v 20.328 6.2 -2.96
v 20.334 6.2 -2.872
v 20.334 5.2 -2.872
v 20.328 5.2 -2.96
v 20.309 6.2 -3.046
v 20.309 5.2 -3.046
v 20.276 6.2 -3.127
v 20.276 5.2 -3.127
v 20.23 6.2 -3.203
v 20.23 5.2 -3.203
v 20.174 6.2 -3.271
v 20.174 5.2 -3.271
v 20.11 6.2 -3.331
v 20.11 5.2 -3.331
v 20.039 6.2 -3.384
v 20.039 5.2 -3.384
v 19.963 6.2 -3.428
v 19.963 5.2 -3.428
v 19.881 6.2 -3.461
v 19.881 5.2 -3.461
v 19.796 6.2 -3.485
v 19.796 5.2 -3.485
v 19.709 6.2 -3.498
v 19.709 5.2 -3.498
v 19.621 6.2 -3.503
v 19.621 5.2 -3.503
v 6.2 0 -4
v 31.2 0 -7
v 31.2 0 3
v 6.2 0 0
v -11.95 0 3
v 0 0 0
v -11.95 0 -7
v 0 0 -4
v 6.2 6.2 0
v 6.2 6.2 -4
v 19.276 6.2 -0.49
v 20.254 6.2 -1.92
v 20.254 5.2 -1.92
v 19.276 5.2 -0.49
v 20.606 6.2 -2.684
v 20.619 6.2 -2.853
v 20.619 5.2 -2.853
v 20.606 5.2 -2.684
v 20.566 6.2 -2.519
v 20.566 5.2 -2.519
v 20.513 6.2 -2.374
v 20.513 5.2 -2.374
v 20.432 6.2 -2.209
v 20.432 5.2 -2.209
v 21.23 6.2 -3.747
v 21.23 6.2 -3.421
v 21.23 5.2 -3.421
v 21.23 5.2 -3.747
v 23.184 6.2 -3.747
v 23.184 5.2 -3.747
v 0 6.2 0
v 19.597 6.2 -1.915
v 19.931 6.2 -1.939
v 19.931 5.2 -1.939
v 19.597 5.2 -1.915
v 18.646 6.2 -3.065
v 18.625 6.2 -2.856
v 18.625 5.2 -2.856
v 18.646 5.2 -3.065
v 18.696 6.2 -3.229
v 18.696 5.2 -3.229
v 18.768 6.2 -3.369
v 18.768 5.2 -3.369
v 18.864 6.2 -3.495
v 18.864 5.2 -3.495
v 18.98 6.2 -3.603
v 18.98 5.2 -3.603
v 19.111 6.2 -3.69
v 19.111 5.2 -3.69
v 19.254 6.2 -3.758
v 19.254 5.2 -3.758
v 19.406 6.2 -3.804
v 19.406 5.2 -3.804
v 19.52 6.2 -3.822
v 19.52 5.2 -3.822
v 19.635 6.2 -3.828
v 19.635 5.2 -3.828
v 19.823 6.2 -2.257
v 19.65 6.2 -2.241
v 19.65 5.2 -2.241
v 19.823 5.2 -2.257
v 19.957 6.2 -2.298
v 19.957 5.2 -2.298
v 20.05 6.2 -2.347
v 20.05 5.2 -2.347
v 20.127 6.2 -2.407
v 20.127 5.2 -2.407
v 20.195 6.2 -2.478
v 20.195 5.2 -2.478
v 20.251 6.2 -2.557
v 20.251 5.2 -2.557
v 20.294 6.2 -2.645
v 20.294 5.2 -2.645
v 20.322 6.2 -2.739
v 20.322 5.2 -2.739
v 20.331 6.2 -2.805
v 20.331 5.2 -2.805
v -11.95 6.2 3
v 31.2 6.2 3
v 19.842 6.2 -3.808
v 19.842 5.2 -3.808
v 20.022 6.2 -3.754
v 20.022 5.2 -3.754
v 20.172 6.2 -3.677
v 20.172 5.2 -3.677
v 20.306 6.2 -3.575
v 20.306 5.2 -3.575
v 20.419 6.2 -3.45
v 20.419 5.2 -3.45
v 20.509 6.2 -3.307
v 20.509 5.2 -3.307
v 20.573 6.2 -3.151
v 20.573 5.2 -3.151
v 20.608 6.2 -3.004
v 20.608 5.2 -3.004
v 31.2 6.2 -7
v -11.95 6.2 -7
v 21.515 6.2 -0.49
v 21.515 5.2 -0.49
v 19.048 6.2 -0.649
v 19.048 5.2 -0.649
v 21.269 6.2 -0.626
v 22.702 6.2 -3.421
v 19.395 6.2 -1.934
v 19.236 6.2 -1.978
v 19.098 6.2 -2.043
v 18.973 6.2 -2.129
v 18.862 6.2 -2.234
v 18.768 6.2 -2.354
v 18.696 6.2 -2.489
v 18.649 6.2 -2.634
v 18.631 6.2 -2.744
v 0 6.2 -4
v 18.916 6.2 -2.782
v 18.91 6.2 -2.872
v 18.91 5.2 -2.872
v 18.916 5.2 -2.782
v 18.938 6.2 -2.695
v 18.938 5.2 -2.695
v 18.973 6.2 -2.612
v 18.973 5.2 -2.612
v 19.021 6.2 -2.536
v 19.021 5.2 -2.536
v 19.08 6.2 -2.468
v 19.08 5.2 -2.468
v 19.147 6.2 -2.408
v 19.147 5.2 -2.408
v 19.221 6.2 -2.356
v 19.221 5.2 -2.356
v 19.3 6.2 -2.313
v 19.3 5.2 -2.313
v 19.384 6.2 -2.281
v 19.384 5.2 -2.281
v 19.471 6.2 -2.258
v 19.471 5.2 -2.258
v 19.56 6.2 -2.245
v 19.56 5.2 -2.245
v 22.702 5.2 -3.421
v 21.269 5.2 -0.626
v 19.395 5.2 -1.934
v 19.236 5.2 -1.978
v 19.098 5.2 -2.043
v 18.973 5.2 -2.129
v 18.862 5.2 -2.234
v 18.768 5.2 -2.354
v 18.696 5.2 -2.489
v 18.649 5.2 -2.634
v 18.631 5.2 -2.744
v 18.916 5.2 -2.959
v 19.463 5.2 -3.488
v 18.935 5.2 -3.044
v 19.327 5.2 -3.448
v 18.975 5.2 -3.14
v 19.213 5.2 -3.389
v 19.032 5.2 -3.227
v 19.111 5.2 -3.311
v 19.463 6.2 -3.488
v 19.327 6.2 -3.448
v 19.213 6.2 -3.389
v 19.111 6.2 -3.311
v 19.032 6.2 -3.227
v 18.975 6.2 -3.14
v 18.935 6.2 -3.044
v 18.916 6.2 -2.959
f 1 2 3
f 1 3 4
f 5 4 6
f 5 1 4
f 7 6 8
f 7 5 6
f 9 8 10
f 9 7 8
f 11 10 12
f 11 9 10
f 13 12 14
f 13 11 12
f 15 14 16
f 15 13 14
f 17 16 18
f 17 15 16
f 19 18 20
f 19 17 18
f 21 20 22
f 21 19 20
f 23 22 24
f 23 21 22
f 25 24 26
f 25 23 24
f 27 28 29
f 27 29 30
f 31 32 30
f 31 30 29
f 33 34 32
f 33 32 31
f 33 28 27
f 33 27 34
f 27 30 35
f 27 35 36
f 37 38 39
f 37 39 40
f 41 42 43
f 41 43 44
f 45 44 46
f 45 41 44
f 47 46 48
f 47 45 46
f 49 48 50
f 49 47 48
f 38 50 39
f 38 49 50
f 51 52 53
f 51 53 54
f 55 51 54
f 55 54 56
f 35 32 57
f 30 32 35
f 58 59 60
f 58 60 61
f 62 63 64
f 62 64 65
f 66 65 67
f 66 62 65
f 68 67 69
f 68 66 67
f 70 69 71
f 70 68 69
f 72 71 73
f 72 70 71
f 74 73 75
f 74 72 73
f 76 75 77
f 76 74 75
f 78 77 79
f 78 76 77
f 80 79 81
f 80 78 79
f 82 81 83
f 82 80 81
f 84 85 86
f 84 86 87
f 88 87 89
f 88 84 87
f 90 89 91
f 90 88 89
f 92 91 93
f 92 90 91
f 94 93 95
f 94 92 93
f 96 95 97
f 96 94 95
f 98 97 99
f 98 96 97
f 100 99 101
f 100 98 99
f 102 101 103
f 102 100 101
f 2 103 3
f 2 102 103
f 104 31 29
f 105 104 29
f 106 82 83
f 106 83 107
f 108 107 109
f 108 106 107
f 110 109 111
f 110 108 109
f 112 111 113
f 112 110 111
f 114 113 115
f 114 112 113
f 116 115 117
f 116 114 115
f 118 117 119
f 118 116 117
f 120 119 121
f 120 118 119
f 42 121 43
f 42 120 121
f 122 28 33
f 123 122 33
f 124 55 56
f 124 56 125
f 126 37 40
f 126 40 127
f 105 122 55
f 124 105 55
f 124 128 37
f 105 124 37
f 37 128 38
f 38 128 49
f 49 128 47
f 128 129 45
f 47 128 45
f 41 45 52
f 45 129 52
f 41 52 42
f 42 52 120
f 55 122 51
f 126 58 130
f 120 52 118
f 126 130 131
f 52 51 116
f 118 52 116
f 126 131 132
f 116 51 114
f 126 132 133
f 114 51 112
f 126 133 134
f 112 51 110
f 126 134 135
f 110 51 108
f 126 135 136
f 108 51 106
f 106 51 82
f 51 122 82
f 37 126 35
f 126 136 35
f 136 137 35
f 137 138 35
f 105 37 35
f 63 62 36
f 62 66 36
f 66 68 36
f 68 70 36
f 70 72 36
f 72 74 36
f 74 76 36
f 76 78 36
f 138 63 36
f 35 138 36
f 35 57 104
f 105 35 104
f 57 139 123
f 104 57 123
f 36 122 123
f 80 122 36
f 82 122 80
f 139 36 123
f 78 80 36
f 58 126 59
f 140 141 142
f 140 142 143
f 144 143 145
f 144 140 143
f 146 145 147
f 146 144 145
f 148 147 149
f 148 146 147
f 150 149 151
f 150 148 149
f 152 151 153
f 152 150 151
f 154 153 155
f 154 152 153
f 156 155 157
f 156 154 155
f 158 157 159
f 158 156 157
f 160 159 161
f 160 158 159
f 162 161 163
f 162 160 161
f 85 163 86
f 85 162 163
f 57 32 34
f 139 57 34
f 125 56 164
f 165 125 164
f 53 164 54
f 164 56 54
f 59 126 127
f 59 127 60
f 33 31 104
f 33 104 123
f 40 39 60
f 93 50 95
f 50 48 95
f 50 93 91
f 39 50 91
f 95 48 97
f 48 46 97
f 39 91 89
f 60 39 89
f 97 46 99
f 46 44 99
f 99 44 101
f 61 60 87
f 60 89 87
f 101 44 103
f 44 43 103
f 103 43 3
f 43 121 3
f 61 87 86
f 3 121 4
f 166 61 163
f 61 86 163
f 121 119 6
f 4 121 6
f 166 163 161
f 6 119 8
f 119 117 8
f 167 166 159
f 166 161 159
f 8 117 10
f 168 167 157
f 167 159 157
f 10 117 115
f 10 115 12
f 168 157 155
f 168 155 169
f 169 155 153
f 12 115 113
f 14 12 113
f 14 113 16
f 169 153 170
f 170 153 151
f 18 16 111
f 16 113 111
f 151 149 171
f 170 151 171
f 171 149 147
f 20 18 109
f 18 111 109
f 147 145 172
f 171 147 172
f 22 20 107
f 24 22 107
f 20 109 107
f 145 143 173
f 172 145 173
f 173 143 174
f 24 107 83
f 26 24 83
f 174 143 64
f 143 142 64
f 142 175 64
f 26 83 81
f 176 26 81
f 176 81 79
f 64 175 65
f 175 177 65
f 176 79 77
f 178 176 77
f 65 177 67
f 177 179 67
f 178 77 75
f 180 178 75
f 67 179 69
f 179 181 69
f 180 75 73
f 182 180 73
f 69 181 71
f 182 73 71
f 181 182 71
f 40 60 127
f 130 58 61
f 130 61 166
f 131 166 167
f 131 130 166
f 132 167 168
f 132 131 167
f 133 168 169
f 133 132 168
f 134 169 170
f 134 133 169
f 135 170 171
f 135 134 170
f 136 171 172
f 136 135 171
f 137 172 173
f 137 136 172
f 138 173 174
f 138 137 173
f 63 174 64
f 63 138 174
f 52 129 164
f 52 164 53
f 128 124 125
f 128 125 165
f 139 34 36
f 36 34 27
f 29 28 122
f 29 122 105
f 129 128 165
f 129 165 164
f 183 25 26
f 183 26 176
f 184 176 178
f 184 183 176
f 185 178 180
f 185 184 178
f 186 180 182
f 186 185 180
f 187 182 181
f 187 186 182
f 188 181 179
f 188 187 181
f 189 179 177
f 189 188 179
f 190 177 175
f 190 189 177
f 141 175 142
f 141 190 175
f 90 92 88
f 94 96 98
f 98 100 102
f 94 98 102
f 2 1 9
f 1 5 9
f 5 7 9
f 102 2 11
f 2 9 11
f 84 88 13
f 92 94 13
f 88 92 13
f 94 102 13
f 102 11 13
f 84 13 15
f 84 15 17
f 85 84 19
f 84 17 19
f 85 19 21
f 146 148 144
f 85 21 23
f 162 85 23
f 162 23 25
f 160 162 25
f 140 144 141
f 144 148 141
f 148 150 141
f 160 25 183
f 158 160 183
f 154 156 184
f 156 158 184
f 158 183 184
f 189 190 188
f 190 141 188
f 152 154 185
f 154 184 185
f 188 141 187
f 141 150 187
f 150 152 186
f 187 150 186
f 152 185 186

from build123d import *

# Parameters (mm, degrees)
SKETCH2_W           = 6.2
SKETCH2_H           = 4
BOSS_EXTRUDE1_DEPTH = 6.2
CUT_EXTRUDE1_DEPTH  = 1


with BuildPart() as part:
    # Sketch2 → Boss-Extrude1 (new body)
    with BuildSketch(Plane(origin=(0, 0, 0), x_dir=(1, 0, 0), z_dir=(0, 1, 0))):
        Polygon((-0.1, 7), (6.2, 7), (31.2, 7), (31.2, -3), (6.2, -3), (-0.1, -3), (-11.95, -3), (-11.95, 7), align=None)
        with Locations((3.1, 2)):
            Rectangle(SKETCH2_W, SKETCH2_H, mode=Mode.SUBTRACT)
    extrude(amount=BOSS_EXTRUDE1_DEPTH)

    # Sketch3 → Cut-Extrude1 (cut)
    with BuildSketch(Plane(origin=(0, 6.2, 0), x_dir=(1, 0, 0), z_dir=(0, 1, 0))):
        with BuildLine():
            Line((19.276089489, 0.490389836), (19.048395179, 0.648758226))
            Line((19.048395179, 0.648758226), (19.931187647, 1.939237994))
            add(Edge.make_bspline(
                [(19.931187647, 1.939237994), (19.874862479, 1.93235), (19.763955085, 1.918787158), (19.652252142, 1.91629555), (19.597278392, 1.915069324)],
                knots=[0, 0, 0, 0, 0.000170115, 0.000334967, 0.000334967, 0.000334967, 0.000334967], degree=3))
            add(Edge.make_bspline(
                [(19.597278392, 1.915069324), (19.563948105, 1.915923014), (19.498523668, 1.917598735), (19.402337812, 1.930880947), (19.309913054, 1.951337134), (19.221494424, 1.981861362), (19.136749587, 2.019796451), (19.055863547, 2.066838171), (18.978945189, 2.122179593), (18.90682061, 2.185528092), (18.841223533, 2.25508604), (18.782782398, 2.328705801), (18.734212943, 2.407242575), (18.693866326, 2.489094274), (18.663267986, 2.575437356), (18.640986256, 2.665289312), (18.62726812, 2.759279873), (18.625636083, 2.823256242), (18.624807438, 2.855739396)],
                knots=[0, 0, 0, 0, 9.9954e-05, 0.000196201, 0.000290782, 0.000383503, 0.000476303, 0.000568919, 0.000663705, 0.000760153, 0.000856434, 0.000950205, 0.001041624, 0.001132931, 0.001223461, 0.001315861, 0.001410305, 0.001507717, 0.001507717, 0.001507717, 0.001507717], degree=3))
            add(Edge.make_bspline(
                [(18.624807438, 2.855739396), (18.626380818, 2.900160959), (18.629469044, 2.987351477), (18.654323414, 3.114744968), (18.695199578, 3.235201332), (18.752193892, 3.348403865), (18.823980389, 3.45272415), (18.910257467, 3.54671196), (19.010500349, 3.629030506), (19.122425466, 3.699791348), (19.243395707, 3.756700952), (19.370095132, 3.798646603), (19.501552941, 3.823319753), (19.590605042, 3.826572641), (19.635439449, 3.828210349)],
                knots=[0, 0, 0, 0, 0.000133185, 0.000261414, 0.000387724, 0.00051373, 0.000640399, 0.00076644, 0.000895188, 0.001028407, 0.001162697, 0.001295241, 0.001427846, 0.0015623, 0.0015623, 0.0015623, 0.0015623], degree=3))
            add(Edge.make_bspline(
                [(19.635439449, 3.828210349), (19.679425373, 3.82655013), (19.766337412, 3.823269693), (19.894143868, 3.79924495), (20.016554647, 3.758753111), (20.132891171, 3.702796399), (20.240604781, 3.63265529), (20.337465695, 3.549076115), (20.421263506, 3.452006815), (20.491860883, 3.343795114), (20.548530134, 3.227529352), (20.589417134, 3.106168222), (20.614586392, 2.980584525), (20.61775806, 2.895499538), (20.61935872, 2.852559308)],
                knots=[0, 0, 0, 0, 0.000131915, 0.000260652, 0.000388569, 0.000517718, 0.000646848, 0.000773094, 0.000900237, 0.001030248, 0.001159674, 0.001287189, 0.001413545, 0.001542287, 0.001542287, 0.001542287, 0.001542287], degree=3))
            add(Edge.make_bspline(
                [(20.61935872, 2.852559308), (20.618289735, 2.819227462), (20.616121566, 2.75162215), (20.600939344, 2.648906053), (20.575158176, 2.544175295), (20.545901278, 2.455527847), (20.517659955, 2.382313754), (20.491079642, 2.324481963), (20.461586475, 2.263611531), (20.427188737, 2.200340732), (20.390211511, 2.133863004), (20.348429167, 2.064845112), (20.302794827, 1.993194439), (20.270292153, 1.944891724), (20.253648584, 1.920157465)],
                knots=[0, 0, 0, 0, 9.9984e-05, 0.000202793, 0.000310776, 0.000423207, 0.000482616, 0.000546097, 0.000614079, 0.0006855, 0.000762103, 0.000842274, 0.000927493, 0.001016928, 0.001016928, 0.001016928, 0.001016928], degree=3))
            Line((20.253648584, 1.920157465), (19.276089489, 0.490389836))
        make_face()
        with BuildLine():
            add(Edge.make_bspline(
                [(19.650067855, 2.240710349), (19.675317282, 2.241400126), (19.724469333, 2.242742887), (19.796475883, 2.250915556), (19.864442839, 2.265406244), (19.928551758, 2.286197697), (19.989445447, 2.311286246), (20.046156688, 2.343228548), (20.098732942, 2.381343638), (20.147526275, 2.424169867), (20.190855047, 2.471750039), (20.229447653, 2.521549557), (20.262250454, 2.573787025), (20.288161426, 2.629116627), (20.309465291, 2.686191523), (20.324177345, 2.745930831), (20.332327419, 2.808023309), (20.333716776, 2.850204234), (20.334422823, 2.871639836)],
                knots=[0, 0, 0, 0, 7.5753e-05, 0.000147465, 0.000217073, 0.000283852, 0.000349411, 0.000414338, 0.000478589, 0.000543925, 0.000608743, 0.000671332, 0.000732749, 0.000793345, 0.000854313, 0.000915245, 0.00097749, 0.001041807, 0.001041807, 0.001041807, 0.001041807], degree=3))
            add(Edge.make_bspline(
                [(20.334422823, 2.871639836), (20.333815337, 2.89308439), (20.332618212, 2.935343513), (20.323014019, 2.99752792), (20.306118281, 3.057121092), (20.283448341, 3.114449282), (20.253584983, 3.169041477), (20.217749678, 3.221583075), (20.175175241, 3.271740933), (20.126187199, 3.318335404), (20.07336014, 3.361286713), (20.017062401, 3.399192653), (19.957758012, 3.430961881), (19.895808782, 3.457177375), (19.831085637, 3.477635058), (19.763626877, 3.492346524), (19.693091616, 3.500485187), (19.645211449, 3.501865763), (19.620811044, 3.502569324)],
                knots=[0, 0, 0, 0, 6.4316e-05, 0.000126743, 0.000188161, 0.000249812, 0.000311283, 0.000374438, 0.00044032, 0.000508243, 0.00057698, 0.000644365, 0.000711521, 0.0007785, 0.000845884, 0.000914871, 0.00098532, 0.001058531, 0.001058531, 0.001058531, 0.001058531], degree=3))
            add(Edge.make_bspline(
                [(19.620811044, 3.502569324), (19.596622848, 3.501864626), (19.549165806, 3.500482016), (19.479257604, 3.492361994), (19.412254973, 3.477536119), (19.347719361, 3.457186851), (19.285771971, 3.430959926), (19.22647038, 3.399190988), (19.170159472, 3.361295438), (19.117383061, 3.318301609), (19.068308518, 3.271957816), (19.026466073, 3.221363348), (18.990548757, 3.169068808), (18.960726433, 3.114442018), (18.938045578, 3.057123031), (18.921152762, 2.997527395), (18.911547784, 2.93534365), (18.910350767, 2.893084436), (18.909743336, 2.871639836)],
                knots=[0, 0, 0, 0, 7.2576e-05, 0.000142393, 0.000210758, 0.000278143, 0.000345121, 0.000412278, 0.000479663, 0.0005484, 0.000616323, 0.000681795, 0.00074495, 0.000806421, 0.000868072, 0.00092949, 0.000991917, 0.001056233, 0.001056233, 0.001056233, 0.001056233], degree=3))
            add(Edge.make_bspline(
                [(18.909743336, 2.871639836), (18.910292997, 2.850187542), (18.91137703, 2.807879691), (18.921834382, 2.745716463), (18.939322536, 2.686127887), (18.962744412, 2.62853456), (18.993588712, 2.573496517), (19.031438202, 2.521274696), (19.075802519, 2.471277109), (19.126088611, 2.424280567), (19.1811233, 2.38114395), (19.239903206, 2.343469961), (19.301416415, 2.311654244), (19.365879466, 2.286125988), (19.432814634, 2.265613979), (19.502823503, 2.250942263), (19.575674547, 2.242821278), (19.625032174, 2.241420743), (19.650067855, 2.240710349)],
                knots=[0, 0, 0, 0, 6.4316e-05, 0.000126844, 0.000188436, 0.000250326, 0.000312966, 0.000377217, 0.000443451, 0.000513196, 0.000583426, 0.000652939, 0.000722346, 0.000790847, 0.000860662, 0.000932137, 0.001005113, 0.00108023, 0.00108023, 0.00108023, 0.00108023], degree=3))
        make_face(mode=Mode.SUBTRACT)
        Polygon((21.229935643, 3.746800093), (23.183781797, 3.746800093), (21.514871541, 0.490389836), (21.268732719, 0.625861591), (22.701680435, 3.421159067), (21.229935643, 3.421159067), align=None)
    extrude(amount=-CUT_EXTRUDE1_DEPTH, mode=Mode.SUBTRACT)


solid = part.part
